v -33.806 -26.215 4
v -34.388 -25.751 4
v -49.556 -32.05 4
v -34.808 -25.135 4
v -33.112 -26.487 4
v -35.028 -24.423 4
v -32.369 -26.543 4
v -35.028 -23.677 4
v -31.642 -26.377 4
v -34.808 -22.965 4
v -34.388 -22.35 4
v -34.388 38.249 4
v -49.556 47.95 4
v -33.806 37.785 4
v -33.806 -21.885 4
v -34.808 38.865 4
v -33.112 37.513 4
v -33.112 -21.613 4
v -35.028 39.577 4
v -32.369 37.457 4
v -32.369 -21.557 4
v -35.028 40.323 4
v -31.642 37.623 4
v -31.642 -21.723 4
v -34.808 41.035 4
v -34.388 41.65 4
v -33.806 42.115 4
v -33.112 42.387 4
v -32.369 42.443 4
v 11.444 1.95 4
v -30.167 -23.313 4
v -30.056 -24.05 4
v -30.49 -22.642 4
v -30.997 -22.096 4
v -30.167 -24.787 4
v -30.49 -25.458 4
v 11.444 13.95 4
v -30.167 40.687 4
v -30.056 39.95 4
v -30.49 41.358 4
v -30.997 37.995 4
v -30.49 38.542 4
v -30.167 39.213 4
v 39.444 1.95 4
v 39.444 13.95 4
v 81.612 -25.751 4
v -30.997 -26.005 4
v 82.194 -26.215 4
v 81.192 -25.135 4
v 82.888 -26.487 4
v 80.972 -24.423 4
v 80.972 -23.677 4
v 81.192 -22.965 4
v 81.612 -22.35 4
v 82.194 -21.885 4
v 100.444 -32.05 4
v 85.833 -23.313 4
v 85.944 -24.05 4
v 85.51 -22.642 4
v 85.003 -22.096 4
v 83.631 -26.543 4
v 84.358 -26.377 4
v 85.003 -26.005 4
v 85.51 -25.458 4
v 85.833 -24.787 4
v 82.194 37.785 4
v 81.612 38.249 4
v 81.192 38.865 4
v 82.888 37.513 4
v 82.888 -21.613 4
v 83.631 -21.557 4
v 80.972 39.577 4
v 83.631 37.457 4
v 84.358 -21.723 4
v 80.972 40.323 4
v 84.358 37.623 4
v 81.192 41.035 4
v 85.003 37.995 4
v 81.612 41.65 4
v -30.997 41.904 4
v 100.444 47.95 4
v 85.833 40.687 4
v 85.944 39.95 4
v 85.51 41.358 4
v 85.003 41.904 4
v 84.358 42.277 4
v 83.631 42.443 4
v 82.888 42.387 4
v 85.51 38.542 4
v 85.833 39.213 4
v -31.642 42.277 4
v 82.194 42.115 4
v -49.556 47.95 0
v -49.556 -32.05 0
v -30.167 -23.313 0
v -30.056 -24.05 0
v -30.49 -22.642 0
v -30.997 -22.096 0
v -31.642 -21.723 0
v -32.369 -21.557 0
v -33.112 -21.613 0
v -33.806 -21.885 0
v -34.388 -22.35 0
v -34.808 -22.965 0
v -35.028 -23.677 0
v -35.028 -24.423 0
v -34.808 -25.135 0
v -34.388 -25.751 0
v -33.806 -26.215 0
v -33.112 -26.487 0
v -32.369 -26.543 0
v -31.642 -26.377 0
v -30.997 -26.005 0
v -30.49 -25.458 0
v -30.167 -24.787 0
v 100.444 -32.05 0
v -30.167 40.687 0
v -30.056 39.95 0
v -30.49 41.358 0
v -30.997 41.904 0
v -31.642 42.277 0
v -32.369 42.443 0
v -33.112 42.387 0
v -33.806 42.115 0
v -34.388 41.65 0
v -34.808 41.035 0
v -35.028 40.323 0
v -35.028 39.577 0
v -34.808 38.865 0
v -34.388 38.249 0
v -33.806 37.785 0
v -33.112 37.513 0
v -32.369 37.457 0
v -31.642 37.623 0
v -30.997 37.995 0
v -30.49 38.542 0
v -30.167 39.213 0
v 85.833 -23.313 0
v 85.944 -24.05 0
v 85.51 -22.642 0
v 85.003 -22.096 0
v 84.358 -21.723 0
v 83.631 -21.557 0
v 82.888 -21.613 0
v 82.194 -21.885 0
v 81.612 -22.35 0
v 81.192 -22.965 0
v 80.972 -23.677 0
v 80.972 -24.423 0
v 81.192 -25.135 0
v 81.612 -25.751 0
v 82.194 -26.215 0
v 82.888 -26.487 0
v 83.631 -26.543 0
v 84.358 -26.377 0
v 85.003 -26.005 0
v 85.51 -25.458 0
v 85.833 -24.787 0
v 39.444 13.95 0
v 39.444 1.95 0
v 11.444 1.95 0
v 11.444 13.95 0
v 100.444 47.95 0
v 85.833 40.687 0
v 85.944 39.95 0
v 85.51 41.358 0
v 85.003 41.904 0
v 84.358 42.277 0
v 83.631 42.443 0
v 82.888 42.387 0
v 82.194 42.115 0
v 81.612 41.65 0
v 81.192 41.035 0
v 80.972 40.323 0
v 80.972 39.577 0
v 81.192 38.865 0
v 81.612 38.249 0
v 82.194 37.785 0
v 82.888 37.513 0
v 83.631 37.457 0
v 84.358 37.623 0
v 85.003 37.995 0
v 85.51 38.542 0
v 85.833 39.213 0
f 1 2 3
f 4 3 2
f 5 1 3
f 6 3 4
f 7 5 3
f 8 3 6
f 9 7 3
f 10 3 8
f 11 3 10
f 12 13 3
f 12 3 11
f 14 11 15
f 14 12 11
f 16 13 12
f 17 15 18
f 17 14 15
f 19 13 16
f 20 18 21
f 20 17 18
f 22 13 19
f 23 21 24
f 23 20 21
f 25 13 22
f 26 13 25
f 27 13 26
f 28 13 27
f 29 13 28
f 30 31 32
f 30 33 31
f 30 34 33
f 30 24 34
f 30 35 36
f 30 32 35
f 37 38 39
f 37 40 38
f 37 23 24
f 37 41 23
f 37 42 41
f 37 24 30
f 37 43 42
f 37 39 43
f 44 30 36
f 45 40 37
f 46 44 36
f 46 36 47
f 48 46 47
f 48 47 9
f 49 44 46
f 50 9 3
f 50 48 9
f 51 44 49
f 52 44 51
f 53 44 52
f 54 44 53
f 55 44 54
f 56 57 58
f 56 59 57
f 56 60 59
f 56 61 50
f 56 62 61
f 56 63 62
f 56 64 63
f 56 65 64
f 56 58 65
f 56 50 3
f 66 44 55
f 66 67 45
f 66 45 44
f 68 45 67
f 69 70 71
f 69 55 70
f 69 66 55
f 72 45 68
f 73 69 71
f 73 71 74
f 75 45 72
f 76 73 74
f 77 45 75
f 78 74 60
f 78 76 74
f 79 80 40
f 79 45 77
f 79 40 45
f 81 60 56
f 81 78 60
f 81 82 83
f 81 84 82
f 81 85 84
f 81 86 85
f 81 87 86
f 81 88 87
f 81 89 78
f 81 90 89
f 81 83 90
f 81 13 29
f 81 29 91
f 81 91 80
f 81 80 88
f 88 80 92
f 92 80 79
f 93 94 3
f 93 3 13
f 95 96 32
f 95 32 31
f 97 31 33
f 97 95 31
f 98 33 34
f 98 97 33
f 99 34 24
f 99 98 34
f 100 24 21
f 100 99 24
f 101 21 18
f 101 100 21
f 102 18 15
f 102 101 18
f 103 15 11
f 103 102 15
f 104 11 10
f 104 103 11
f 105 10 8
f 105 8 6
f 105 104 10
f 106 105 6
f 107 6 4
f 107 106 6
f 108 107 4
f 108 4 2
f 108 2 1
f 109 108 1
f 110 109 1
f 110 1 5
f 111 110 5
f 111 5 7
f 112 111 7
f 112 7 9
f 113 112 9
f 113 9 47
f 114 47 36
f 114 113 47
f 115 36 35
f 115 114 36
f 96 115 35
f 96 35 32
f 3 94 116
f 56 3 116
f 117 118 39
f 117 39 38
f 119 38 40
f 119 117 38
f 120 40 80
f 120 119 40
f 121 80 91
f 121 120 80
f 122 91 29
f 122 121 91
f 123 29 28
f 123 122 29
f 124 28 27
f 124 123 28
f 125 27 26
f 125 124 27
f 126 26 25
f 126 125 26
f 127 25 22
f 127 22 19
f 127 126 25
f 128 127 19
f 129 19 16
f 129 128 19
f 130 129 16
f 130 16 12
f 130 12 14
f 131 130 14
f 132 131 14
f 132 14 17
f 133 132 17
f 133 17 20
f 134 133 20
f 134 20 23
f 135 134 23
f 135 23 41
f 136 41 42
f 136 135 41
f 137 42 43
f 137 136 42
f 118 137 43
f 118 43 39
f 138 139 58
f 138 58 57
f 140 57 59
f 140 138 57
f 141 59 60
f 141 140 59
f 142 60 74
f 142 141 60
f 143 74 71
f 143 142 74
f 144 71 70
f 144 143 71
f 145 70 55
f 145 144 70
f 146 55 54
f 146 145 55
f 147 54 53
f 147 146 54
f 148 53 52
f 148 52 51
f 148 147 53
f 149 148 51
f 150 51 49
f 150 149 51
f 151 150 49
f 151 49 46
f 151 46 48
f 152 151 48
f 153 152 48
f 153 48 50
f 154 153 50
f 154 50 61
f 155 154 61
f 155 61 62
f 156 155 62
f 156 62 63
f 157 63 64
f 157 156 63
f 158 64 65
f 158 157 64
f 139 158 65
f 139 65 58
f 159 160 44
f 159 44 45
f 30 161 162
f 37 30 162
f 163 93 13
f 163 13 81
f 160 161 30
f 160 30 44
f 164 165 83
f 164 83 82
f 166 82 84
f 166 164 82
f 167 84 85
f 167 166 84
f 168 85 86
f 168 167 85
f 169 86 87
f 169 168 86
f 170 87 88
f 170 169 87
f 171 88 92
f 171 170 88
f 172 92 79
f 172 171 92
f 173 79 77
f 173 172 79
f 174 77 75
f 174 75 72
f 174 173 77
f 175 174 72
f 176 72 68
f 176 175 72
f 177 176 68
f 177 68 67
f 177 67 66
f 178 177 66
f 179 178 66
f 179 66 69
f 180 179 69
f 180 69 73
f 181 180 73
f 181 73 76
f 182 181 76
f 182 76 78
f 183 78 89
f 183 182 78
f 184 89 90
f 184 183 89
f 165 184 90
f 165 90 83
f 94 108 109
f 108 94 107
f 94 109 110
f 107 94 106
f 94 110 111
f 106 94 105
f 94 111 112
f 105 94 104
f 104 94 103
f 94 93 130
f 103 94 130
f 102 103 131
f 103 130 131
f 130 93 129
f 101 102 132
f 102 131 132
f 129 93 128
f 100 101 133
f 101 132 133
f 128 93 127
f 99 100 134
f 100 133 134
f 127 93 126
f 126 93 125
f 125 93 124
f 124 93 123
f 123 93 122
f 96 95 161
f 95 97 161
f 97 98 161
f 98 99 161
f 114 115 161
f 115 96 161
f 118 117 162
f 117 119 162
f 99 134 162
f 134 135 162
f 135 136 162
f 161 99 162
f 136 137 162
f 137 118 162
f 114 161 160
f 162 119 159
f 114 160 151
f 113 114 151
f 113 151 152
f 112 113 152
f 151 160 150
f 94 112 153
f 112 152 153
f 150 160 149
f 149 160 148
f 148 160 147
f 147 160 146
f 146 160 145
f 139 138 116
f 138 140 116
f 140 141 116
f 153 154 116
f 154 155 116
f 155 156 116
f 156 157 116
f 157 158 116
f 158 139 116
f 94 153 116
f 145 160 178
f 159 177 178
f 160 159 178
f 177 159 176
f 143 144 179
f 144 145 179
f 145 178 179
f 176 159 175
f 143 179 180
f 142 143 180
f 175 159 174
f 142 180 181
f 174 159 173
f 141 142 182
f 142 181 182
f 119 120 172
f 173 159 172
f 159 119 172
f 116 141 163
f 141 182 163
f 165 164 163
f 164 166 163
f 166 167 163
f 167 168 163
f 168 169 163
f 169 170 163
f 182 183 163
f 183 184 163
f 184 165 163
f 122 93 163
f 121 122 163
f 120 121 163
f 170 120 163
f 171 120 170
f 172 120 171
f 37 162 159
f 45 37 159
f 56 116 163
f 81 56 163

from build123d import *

# Parameters (mm, degrees)
ESBO_O1_W                = 150
ESBO_O1_H                = 80
ESBO_O1_R                = 2.5
ESBO_O1_W_2              = 28
ESBO_O1_H_2              = 12
RESSALTO_EXTRUS_O2_DEPTH = 4


with BuildPart() as part:
    # Esboço1 → Ressalto-extrusão2 (new body)
    with BuildSketch(Plane.XY):
        with Locations((25.444262425, 7.949915335)):
            Rectangle(ESBO_O1_W, ESBO_O1_H)
        with Locations((-32.555737575, 39.949915335)):
            Circle(ESBO_O1_R, mode=Mode.SUBTRACT)
        with Locations((-32.555737575, -24.050084665)):
            Circle(ESBO_O1_R, mode=Mode.SUBTRACT)
        with Locations((83.444262425, 39.949915335)):
            Circle(ESBO_O1_R, mode=Mode.SUBTRACT)
        with Locations((83.444262425, -24.050084665)):
            Circle(ESBO_O1_R, mode=Mode.SUBTRACT)
        with Locations((25.444262425, 7.949915335)):
            Rectangle(ESBO_O1_W_2, ESBO_O1_H_2, mode=Mode.SUBTRACT)
    extrude(amount=RESSALTO_EXTRUS_O2_DEPTH)


solid = part.part
